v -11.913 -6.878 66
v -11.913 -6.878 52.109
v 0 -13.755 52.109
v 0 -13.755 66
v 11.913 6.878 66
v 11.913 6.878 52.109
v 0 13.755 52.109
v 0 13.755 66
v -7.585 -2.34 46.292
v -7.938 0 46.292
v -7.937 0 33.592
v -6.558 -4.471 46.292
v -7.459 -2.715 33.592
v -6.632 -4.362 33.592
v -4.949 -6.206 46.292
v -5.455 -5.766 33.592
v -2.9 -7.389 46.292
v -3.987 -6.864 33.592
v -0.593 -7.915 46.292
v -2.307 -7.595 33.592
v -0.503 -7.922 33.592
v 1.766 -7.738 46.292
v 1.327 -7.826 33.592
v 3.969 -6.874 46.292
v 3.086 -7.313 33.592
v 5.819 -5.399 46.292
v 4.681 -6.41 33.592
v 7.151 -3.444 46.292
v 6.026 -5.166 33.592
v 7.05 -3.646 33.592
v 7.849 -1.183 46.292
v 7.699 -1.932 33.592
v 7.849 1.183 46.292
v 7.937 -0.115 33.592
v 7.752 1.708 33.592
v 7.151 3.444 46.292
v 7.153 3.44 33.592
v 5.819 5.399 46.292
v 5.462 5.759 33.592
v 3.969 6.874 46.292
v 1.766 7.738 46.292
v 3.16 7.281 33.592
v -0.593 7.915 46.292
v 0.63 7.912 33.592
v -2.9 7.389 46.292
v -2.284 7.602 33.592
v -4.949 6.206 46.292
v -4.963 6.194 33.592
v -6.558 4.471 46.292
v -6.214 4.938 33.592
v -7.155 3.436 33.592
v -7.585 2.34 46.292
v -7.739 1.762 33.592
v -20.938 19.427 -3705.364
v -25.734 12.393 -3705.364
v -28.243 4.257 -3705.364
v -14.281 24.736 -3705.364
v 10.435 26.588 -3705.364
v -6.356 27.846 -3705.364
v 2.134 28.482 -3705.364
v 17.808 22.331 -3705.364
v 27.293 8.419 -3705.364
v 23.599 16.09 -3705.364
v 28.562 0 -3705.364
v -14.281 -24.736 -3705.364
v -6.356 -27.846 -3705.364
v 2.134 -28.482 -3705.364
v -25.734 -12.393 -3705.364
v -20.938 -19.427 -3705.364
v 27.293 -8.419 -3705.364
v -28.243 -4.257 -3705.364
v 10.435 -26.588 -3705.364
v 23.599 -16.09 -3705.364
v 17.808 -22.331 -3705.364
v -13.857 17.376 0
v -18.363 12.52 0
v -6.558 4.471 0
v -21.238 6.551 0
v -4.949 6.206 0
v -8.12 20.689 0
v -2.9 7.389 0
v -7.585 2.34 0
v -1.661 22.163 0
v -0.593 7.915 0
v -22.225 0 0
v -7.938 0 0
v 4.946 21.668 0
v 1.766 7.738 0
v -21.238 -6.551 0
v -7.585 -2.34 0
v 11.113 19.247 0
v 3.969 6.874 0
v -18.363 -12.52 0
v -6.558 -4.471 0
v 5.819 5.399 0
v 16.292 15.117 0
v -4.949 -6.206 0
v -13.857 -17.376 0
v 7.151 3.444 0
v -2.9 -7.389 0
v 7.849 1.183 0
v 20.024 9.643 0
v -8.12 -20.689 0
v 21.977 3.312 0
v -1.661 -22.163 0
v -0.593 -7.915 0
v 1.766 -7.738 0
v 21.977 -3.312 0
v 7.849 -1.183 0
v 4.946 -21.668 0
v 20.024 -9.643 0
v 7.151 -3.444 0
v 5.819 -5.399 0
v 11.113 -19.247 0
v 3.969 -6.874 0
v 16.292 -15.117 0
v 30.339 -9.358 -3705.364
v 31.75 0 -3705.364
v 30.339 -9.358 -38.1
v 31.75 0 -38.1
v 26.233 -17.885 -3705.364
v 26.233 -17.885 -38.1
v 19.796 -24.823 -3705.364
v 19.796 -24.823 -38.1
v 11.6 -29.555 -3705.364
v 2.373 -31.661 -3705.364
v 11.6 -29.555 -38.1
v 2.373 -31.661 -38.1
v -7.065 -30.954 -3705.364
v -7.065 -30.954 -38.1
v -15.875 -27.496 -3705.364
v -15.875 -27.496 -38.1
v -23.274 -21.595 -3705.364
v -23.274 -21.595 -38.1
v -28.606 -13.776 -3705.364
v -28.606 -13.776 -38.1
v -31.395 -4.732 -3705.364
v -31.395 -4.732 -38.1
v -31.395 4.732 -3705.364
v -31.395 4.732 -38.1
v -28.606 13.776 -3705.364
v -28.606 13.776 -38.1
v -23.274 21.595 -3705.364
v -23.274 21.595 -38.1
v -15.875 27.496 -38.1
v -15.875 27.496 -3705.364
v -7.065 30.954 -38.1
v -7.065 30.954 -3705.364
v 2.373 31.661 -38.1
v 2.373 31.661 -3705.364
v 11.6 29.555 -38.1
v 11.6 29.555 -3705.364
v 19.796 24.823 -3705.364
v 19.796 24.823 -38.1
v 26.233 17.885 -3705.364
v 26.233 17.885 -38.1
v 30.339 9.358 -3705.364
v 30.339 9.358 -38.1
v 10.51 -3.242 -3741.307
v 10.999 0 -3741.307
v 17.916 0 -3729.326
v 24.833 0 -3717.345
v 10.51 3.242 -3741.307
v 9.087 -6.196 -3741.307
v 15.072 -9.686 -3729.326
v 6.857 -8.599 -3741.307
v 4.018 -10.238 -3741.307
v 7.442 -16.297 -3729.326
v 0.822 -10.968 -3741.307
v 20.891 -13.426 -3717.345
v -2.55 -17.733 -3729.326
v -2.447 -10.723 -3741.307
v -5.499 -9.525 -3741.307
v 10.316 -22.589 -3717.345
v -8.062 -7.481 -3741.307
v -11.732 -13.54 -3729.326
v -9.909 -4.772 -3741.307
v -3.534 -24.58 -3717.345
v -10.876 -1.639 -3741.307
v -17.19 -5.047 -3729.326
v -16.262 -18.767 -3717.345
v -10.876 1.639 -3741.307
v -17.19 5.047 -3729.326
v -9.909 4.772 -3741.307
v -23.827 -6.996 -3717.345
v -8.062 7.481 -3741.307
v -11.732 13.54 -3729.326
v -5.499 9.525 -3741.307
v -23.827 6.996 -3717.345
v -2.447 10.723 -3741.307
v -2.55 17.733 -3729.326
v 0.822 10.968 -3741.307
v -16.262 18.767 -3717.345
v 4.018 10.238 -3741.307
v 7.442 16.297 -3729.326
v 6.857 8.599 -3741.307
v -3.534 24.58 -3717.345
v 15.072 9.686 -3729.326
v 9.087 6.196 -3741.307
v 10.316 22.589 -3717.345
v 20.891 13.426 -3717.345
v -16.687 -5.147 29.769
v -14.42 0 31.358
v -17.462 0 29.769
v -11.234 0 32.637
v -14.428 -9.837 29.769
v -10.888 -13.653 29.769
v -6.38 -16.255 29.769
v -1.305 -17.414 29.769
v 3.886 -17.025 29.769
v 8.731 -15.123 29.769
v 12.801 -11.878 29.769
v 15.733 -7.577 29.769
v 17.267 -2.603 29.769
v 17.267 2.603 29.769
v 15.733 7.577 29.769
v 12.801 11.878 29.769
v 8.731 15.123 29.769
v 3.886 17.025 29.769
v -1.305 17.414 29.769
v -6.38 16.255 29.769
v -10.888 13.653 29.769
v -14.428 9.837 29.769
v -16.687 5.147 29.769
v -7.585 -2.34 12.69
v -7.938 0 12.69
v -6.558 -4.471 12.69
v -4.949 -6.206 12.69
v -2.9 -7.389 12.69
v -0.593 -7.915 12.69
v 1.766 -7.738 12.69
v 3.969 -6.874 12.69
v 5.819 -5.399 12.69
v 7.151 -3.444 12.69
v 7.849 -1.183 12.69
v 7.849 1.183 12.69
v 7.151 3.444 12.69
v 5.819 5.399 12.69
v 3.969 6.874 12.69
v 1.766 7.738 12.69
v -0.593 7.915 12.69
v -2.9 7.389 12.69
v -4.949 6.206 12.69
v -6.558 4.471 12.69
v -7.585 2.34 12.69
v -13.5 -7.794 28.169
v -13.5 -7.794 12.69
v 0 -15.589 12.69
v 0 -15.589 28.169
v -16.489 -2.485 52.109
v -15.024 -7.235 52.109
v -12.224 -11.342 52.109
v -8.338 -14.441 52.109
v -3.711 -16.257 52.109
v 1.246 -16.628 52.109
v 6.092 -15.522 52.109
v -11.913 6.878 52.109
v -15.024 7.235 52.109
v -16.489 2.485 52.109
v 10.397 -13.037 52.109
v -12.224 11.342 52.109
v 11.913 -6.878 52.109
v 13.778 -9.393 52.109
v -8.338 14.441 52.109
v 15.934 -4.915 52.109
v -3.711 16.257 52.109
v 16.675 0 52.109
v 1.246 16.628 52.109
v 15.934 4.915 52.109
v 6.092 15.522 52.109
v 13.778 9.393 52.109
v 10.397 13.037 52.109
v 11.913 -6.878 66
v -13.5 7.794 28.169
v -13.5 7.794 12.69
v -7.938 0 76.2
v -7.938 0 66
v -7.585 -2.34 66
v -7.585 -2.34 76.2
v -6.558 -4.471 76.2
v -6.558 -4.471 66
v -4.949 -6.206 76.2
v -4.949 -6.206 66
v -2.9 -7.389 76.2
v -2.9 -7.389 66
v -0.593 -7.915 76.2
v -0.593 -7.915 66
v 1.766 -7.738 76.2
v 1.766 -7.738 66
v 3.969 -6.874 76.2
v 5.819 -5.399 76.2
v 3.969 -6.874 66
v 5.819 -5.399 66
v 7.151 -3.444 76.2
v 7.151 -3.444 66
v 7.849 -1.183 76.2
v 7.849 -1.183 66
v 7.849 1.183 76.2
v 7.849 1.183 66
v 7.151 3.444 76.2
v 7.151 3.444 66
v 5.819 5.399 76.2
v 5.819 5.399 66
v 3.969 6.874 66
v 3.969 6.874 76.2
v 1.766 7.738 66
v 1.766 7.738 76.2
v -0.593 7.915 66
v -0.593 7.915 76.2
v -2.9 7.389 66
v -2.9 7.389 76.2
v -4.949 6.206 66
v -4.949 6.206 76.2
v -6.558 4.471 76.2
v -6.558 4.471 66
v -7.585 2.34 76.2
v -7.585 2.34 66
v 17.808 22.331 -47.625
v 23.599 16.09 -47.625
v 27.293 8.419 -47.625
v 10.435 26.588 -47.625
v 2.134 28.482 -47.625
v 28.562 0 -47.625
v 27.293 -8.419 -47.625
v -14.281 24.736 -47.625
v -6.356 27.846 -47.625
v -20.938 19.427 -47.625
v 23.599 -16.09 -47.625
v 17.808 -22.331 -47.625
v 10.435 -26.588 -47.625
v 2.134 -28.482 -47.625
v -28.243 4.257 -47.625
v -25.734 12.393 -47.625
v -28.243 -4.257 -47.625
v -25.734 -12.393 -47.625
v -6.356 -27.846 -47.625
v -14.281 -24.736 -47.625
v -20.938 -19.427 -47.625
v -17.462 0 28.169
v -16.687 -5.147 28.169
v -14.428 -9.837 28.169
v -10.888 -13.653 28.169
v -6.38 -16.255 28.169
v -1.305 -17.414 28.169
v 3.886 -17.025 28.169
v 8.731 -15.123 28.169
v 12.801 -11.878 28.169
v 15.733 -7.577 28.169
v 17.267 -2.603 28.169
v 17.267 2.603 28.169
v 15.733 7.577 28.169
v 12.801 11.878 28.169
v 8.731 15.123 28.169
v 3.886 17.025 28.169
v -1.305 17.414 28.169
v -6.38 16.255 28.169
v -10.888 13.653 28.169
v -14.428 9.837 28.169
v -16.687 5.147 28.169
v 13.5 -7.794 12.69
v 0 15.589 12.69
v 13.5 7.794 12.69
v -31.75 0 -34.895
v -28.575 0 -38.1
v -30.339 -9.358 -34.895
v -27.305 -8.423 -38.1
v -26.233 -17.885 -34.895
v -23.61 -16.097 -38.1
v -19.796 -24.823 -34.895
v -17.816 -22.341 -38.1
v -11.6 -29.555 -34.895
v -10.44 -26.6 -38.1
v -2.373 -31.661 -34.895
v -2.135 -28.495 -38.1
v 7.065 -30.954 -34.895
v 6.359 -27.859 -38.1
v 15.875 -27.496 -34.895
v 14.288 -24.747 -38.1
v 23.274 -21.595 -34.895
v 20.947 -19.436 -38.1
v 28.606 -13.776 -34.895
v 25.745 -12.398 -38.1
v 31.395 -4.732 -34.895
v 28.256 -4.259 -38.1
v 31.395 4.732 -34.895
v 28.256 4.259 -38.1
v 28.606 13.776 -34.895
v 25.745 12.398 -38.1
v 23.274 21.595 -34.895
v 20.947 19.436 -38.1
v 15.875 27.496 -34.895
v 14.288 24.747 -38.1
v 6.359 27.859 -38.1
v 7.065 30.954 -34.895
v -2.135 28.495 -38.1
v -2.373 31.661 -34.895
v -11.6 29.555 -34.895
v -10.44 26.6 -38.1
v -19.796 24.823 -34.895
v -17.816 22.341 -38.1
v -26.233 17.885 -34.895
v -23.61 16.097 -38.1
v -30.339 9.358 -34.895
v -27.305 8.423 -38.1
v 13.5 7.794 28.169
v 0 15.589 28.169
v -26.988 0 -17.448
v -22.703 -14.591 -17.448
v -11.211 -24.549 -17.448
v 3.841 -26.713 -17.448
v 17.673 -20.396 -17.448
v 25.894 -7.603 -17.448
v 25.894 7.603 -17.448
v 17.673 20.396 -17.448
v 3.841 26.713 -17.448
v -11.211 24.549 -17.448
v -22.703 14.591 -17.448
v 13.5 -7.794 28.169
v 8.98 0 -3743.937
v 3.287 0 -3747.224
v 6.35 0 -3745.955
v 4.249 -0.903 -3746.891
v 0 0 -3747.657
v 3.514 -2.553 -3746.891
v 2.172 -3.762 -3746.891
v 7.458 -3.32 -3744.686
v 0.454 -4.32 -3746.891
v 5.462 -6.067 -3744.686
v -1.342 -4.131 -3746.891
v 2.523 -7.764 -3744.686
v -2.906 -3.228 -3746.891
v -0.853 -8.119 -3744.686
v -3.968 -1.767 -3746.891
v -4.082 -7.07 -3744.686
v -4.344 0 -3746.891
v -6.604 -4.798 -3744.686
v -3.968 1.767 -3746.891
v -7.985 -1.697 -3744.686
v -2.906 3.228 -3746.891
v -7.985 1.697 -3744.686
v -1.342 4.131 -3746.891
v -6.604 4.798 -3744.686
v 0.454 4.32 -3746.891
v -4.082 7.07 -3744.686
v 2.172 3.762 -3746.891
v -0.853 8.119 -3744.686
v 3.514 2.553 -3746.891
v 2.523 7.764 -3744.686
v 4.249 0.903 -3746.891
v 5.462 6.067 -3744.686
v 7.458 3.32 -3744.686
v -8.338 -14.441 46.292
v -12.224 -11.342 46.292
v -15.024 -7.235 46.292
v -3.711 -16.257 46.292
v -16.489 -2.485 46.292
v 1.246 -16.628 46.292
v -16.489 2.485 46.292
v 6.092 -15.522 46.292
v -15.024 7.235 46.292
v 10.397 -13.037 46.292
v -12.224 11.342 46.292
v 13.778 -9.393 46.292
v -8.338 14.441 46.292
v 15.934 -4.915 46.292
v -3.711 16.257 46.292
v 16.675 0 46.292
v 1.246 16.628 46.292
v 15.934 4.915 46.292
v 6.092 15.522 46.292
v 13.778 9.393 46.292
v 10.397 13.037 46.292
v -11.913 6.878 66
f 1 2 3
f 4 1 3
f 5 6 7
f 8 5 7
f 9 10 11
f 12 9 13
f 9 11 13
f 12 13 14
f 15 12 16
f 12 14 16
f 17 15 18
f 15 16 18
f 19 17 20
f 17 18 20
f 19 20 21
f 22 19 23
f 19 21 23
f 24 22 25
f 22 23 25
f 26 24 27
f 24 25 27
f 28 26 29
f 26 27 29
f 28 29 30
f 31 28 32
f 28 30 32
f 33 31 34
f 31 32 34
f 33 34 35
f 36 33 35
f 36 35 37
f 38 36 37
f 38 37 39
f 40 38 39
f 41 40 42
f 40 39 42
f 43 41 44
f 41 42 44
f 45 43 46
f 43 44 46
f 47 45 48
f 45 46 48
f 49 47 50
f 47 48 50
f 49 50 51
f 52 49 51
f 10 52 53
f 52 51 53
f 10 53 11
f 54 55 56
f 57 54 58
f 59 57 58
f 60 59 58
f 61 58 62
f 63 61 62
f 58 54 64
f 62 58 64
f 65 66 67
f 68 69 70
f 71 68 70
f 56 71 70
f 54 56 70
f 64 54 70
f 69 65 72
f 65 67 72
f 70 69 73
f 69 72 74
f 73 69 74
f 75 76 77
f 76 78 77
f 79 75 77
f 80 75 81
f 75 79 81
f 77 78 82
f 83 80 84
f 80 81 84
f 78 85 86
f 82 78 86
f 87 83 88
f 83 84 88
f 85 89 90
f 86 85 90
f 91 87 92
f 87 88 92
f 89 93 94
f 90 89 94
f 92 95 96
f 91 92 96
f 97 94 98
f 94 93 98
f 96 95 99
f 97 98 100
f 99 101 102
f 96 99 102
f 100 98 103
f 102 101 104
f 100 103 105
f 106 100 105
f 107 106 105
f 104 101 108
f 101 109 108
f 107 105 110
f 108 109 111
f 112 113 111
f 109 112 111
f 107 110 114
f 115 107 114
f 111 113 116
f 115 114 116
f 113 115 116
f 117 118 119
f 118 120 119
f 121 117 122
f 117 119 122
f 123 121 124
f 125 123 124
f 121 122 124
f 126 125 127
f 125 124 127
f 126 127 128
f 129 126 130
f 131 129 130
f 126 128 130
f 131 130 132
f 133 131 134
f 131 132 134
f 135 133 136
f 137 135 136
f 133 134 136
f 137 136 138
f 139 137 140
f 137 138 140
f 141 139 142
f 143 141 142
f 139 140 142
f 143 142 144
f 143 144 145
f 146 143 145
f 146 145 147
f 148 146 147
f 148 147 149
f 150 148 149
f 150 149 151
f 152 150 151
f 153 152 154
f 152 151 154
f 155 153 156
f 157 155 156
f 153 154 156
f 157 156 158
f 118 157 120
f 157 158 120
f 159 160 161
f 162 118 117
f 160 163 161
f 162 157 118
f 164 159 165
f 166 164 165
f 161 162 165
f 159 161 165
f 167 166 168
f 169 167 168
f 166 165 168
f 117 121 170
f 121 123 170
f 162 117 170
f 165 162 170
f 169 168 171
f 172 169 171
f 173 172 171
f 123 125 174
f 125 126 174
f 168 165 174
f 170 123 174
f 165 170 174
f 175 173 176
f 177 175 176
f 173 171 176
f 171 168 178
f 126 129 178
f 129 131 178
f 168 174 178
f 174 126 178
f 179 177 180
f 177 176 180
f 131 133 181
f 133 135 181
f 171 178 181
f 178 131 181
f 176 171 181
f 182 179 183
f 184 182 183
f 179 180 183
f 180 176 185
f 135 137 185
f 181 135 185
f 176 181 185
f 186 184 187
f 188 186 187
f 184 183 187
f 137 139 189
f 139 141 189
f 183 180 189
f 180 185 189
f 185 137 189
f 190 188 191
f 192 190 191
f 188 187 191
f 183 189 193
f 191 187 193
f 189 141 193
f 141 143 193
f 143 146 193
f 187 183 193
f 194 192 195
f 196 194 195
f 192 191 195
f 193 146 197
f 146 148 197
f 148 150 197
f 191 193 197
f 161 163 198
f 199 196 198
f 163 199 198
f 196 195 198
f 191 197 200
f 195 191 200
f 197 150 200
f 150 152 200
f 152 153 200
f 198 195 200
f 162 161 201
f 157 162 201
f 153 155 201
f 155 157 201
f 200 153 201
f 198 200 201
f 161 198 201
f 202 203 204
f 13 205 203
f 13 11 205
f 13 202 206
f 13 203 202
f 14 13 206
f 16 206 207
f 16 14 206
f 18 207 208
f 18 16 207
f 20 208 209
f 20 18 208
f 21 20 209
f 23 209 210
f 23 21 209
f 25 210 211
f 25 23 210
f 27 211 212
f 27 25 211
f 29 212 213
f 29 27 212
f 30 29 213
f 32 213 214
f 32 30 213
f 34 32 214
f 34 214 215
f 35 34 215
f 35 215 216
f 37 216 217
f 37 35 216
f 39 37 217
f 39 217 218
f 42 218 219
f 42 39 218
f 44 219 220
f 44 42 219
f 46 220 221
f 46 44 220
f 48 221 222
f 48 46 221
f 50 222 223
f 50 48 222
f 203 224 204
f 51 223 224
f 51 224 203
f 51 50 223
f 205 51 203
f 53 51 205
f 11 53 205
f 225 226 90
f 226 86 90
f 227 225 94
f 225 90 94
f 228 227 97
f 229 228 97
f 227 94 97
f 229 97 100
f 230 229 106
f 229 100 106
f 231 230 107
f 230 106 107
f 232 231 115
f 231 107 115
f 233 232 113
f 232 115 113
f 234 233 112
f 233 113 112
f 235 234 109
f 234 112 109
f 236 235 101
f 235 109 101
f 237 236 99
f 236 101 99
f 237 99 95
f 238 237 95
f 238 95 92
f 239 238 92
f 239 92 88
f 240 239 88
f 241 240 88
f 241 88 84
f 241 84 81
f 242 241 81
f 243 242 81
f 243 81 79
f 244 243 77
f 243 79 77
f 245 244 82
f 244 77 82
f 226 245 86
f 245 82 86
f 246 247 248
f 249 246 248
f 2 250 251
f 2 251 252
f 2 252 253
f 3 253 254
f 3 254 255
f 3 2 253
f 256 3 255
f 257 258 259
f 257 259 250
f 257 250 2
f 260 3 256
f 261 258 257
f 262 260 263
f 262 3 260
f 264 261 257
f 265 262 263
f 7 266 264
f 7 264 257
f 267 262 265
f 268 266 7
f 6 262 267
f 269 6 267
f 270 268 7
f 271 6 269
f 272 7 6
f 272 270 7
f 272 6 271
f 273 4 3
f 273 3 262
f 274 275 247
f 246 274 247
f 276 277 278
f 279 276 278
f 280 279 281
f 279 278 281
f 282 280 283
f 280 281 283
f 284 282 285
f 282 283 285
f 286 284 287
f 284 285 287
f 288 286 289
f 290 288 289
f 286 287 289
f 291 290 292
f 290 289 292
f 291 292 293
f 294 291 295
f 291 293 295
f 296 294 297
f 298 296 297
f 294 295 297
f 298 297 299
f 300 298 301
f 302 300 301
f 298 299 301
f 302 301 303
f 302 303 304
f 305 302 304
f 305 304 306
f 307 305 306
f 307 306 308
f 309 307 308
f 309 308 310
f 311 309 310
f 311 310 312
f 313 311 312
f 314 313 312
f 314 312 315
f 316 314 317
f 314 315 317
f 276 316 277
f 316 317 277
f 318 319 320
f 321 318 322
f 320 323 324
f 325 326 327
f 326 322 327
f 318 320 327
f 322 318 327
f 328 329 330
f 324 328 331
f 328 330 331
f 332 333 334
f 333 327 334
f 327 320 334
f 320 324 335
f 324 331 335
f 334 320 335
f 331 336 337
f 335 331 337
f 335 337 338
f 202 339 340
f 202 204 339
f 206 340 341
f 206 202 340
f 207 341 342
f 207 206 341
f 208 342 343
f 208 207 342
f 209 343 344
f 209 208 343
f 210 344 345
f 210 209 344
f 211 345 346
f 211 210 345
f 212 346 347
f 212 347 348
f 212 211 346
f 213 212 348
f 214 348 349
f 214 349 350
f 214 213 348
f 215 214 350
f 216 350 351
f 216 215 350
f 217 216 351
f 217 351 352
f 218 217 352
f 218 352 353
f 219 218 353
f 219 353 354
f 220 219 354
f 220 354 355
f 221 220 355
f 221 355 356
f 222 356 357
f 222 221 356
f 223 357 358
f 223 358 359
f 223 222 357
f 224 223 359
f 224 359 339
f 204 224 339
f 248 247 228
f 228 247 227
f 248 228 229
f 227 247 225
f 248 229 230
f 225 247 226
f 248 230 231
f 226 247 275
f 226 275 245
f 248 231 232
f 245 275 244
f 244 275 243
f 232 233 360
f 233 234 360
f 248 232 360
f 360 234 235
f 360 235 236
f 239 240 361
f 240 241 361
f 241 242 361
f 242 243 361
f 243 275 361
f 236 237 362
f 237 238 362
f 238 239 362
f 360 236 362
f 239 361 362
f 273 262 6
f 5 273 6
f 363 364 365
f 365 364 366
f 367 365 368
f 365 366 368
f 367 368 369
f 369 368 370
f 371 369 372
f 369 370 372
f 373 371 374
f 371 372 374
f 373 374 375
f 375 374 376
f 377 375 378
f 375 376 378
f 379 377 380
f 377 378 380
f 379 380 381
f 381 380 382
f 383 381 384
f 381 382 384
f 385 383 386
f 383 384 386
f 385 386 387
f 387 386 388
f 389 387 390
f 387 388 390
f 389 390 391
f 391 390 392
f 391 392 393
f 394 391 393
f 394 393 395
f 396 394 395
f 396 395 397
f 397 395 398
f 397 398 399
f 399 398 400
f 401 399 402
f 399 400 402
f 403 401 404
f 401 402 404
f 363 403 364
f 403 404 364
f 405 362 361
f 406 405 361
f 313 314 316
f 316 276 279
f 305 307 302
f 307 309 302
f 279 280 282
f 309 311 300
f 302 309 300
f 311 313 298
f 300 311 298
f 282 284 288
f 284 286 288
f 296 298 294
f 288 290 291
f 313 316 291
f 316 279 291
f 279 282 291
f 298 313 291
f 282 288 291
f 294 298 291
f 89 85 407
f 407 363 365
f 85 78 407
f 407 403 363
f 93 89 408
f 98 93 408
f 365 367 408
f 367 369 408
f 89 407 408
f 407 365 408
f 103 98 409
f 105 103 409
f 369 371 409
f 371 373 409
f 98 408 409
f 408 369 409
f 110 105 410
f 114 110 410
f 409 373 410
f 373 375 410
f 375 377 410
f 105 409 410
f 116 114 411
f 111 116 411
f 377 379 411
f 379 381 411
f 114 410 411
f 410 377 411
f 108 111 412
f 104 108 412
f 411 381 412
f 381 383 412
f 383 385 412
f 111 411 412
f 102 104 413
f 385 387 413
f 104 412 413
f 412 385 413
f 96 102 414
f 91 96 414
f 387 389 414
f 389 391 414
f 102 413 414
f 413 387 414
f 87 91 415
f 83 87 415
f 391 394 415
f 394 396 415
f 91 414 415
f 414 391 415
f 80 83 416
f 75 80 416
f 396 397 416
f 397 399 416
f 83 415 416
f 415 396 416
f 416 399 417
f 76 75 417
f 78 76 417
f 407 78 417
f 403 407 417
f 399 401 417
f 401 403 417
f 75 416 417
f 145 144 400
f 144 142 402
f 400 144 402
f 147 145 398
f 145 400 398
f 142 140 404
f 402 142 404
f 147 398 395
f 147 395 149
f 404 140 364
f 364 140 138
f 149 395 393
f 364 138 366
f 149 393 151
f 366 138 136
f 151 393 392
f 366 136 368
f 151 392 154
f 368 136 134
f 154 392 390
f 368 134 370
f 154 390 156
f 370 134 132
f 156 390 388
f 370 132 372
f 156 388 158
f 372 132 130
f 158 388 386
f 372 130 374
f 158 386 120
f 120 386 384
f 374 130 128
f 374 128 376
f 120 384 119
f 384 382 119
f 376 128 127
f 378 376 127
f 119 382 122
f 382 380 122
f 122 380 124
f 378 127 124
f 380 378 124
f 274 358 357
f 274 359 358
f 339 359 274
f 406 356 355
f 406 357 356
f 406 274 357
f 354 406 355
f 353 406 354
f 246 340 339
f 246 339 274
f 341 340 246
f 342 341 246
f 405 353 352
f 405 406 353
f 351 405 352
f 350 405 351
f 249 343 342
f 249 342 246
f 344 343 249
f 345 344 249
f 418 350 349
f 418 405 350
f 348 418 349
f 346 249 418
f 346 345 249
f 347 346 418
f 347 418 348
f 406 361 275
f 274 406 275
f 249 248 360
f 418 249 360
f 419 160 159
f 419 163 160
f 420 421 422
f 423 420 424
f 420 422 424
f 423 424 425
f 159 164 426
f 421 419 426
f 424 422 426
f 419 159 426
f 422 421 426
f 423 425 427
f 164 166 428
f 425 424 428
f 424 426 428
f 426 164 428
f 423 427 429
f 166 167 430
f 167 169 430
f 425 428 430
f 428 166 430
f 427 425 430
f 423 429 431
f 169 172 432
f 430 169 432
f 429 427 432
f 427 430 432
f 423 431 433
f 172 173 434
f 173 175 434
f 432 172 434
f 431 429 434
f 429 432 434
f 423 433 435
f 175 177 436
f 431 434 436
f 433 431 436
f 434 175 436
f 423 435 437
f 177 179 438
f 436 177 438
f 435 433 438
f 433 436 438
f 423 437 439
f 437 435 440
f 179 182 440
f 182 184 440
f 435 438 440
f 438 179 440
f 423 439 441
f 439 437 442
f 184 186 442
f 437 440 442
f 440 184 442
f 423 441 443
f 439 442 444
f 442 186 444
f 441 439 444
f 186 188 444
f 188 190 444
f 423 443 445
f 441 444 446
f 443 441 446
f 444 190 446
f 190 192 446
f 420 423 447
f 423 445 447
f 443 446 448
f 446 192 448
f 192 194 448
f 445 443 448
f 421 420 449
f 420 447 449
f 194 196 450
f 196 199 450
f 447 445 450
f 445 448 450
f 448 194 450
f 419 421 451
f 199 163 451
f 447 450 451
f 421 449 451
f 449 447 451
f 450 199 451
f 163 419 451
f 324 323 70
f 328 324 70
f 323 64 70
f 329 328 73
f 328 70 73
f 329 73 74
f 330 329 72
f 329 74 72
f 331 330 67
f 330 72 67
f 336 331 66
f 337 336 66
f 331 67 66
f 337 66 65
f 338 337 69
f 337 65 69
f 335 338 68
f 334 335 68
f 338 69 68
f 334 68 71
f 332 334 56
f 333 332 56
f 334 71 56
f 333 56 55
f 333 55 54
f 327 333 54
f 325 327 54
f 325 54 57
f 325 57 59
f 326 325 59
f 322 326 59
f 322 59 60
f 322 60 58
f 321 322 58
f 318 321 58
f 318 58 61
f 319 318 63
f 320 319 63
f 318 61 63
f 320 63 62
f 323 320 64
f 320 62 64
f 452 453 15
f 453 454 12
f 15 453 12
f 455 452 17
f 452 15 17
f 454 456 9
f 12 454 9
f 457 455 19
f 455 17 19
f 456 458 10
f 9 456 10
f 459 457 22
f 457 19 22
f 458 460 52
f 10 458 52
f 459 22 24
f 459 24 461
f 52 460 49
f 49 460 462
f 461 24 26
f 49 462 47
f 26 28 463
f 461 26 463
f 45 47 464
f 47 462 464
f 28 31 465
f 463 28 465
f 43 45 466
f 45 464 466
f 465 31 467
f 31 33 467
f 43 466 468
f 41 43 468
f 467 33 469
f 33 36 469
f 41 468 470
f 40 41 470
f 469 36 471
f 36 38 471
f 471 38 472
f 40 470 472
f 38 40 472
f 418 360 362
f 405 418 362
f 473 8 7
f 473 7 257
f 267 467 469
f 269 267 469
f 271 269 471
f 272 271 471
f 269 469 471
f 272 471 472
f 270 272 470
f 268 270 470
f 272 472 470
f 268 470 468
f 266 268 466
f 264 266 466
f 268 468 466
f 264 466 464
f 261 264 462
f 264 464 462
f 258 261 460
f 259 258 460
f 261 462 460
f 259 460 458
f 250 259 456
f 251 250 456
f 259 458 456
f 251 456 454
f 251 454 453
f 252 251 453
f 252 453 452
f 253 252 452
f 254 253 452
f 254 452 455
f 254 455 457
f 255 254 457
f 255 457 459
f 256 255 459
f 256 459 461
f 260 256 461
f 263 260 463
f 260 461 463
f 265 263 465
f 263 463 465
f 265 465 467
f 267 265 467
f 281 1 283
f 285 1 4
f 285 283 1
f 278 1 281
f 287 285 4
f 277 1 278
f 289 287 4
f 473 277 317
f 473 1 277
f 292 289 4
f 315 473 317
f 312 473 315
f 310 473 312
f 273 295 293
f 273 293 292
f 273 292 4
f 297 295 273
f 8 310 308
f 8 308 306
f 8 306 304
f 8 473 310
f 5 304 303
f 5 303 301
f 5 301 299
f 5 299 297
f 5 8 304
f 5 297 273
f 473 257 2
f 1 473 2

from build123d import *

# Parameters (mm, degrees)
BOSS_REVOLVE3_START         = 12.690475
BOSS_REVOLVE3_OUTLINE_R     = 7.9375
BOSS_REVOLVE3_DEPTH         = 15.478125
BOSS_REVOLVE3_START_2       = 46.292398399
BOSS_REVOLVE3_2_OUTLINE_R   = 16.6751
BOSS_REVOLVE3_2_OUTLINE_R_2 = 7.9375
BOSS_REVOLVE3_2_DEPTH       = 5.8166
BOSS_EXTRUDE2_DEPTH         = 13.890625


# Read off the part's stored shape, not the designer's step: Boss-Revolve3
with BuildPart() as part:
    # Sketch1 → Base-Revolve (revolve)
    with BuildSketch(Plane(origin=(0, 0, 0), x_dir=(0, 0, -1), z_dir=(1, 0, 0)), mode=Mode.PRIVATE) as base_revolve_sk:
        Polygon((-76.2, 0), (-76.2, 7.9375), (0, 7.9375), (0, 22.225), (34.895210283, 31.75), (38.1, 28.575), (47.625, 28.575), (47.625, 0), align=None)
    revolve(base_revolve_sk.sketch.rotate(Axis((0, 0, 0), (0, 0, 1)), 90), axis=Axis((0, 0, 0), (0, 0, 1)))

    # Sketch3 → Boss-Revolve2 (revolve)
    with BuildSketch(Plane(origin=(0, 0, 0), x_dir=(0, 0, -1), z_dir=(1, 0, 0)), mode=Mode.PRIVATE) as boss_revolve2_sk:
        with BuildLine():
            Line((-28.1686, 0), (-28.1686, 17.4625))
            Line((-28.1686, 17.4625), (-29.7688, 17.4625))
            ThreePointArc((-29.7688, 17.4625), (-33.309963658, 9.048473715), (-34.5186, 0))
            Line((-34.5186, 0), (-28.1686, 0))
        make_face()
    revolve(boss_revolve2_sk.sketch.rotate(Axis((0, 0, 0), (0, 0, 1)), 90), axis=Axis((0, 0, 0), (0, 0, 1)))

    # Sketch2 → Boss-Revolve1 (revolve)
    with BuildSketch(Plane(origin=(0, 0, 0), x_dir=(0, 0, -1), z_dir=(1, 0, 0)), mode=Mode.PRIVATE) as boss_revolve1_sk:
        with BuildLine():
            Line((38.1, 31.75), (38.1, 28.5623))
            Line((38.1, 28.5623), (3705.364265314, 28.5623))
            Line((3705.364265314, 28.5623), (3705.364265314, 0))
            Line((3705.364265314, 0), (3747.656878454, 0))
            ThreePointArc((3747.656878454, 0), (3745.955401082, 6.35), (3741.306878454, 10.998522628))
            Line((3741.306878454, 10.998522628), (3705.364265314, 31.75))
            Line((3705.364265314, 31.75), (38.1, 31.75))
        make_face()
    revolve(boss_revolve1_sk.sketch.rotate(Axis((0, 0, 29.7434), (0, 0, -1)), 90), axis=Axis((0, 0, 29.7434), (0, 0, -1)))

    # Boss-Revolve3 outline → Boss-Revolve3 (add)
    with BuildSketch(Plane.XY.offset(BOSS_REVOLVE3_START)):
        Polygon((0, -15.588572738), (13.5001, -7.794286369), (13.5001, 7.794286369), (0, 15.588572738), (-13.5001, 7.794286369), (-13.5001, -7.794286369), align=None)
        Circle(BOSS_REVOLVE3_OUTLINE_R, mode=Mode.SUBTRACT)
    extrude(amount=BOSS_REVOLVE3_DEPTH)

    # Boss-Revolve3 2 outline → Boss-Revolve3 2 (add)
    with BuildSketch(Plane.XY.offset(BOSS_REVOLVE3_START_2)):
        Circle(BOSS_REVOLVE3_2_OUTLINE_R)
        Circle(BOSS_REVOLVE3_2_OUTLINE_R_2, mode=Mode.SUBTRACT)
    extrude(amount=BOSS_REVOLVE3_2_DEPTH)

    # Sketch6 → Boss-Extrude2 (add)
    with BuildSketch(Plane.XY.offset(52.108998399)):
        Polygon((0, -13.755485633), (11.9126, -6.877742817), (11.9126, 6.877742817), (0, 13.755485633), (-11.9126, 6.877742817), (-11.9126, -6.877742817), align=None)
    extrude(amount=BOSS_EXTRUDE2_DEPTH)


solid = part.part
